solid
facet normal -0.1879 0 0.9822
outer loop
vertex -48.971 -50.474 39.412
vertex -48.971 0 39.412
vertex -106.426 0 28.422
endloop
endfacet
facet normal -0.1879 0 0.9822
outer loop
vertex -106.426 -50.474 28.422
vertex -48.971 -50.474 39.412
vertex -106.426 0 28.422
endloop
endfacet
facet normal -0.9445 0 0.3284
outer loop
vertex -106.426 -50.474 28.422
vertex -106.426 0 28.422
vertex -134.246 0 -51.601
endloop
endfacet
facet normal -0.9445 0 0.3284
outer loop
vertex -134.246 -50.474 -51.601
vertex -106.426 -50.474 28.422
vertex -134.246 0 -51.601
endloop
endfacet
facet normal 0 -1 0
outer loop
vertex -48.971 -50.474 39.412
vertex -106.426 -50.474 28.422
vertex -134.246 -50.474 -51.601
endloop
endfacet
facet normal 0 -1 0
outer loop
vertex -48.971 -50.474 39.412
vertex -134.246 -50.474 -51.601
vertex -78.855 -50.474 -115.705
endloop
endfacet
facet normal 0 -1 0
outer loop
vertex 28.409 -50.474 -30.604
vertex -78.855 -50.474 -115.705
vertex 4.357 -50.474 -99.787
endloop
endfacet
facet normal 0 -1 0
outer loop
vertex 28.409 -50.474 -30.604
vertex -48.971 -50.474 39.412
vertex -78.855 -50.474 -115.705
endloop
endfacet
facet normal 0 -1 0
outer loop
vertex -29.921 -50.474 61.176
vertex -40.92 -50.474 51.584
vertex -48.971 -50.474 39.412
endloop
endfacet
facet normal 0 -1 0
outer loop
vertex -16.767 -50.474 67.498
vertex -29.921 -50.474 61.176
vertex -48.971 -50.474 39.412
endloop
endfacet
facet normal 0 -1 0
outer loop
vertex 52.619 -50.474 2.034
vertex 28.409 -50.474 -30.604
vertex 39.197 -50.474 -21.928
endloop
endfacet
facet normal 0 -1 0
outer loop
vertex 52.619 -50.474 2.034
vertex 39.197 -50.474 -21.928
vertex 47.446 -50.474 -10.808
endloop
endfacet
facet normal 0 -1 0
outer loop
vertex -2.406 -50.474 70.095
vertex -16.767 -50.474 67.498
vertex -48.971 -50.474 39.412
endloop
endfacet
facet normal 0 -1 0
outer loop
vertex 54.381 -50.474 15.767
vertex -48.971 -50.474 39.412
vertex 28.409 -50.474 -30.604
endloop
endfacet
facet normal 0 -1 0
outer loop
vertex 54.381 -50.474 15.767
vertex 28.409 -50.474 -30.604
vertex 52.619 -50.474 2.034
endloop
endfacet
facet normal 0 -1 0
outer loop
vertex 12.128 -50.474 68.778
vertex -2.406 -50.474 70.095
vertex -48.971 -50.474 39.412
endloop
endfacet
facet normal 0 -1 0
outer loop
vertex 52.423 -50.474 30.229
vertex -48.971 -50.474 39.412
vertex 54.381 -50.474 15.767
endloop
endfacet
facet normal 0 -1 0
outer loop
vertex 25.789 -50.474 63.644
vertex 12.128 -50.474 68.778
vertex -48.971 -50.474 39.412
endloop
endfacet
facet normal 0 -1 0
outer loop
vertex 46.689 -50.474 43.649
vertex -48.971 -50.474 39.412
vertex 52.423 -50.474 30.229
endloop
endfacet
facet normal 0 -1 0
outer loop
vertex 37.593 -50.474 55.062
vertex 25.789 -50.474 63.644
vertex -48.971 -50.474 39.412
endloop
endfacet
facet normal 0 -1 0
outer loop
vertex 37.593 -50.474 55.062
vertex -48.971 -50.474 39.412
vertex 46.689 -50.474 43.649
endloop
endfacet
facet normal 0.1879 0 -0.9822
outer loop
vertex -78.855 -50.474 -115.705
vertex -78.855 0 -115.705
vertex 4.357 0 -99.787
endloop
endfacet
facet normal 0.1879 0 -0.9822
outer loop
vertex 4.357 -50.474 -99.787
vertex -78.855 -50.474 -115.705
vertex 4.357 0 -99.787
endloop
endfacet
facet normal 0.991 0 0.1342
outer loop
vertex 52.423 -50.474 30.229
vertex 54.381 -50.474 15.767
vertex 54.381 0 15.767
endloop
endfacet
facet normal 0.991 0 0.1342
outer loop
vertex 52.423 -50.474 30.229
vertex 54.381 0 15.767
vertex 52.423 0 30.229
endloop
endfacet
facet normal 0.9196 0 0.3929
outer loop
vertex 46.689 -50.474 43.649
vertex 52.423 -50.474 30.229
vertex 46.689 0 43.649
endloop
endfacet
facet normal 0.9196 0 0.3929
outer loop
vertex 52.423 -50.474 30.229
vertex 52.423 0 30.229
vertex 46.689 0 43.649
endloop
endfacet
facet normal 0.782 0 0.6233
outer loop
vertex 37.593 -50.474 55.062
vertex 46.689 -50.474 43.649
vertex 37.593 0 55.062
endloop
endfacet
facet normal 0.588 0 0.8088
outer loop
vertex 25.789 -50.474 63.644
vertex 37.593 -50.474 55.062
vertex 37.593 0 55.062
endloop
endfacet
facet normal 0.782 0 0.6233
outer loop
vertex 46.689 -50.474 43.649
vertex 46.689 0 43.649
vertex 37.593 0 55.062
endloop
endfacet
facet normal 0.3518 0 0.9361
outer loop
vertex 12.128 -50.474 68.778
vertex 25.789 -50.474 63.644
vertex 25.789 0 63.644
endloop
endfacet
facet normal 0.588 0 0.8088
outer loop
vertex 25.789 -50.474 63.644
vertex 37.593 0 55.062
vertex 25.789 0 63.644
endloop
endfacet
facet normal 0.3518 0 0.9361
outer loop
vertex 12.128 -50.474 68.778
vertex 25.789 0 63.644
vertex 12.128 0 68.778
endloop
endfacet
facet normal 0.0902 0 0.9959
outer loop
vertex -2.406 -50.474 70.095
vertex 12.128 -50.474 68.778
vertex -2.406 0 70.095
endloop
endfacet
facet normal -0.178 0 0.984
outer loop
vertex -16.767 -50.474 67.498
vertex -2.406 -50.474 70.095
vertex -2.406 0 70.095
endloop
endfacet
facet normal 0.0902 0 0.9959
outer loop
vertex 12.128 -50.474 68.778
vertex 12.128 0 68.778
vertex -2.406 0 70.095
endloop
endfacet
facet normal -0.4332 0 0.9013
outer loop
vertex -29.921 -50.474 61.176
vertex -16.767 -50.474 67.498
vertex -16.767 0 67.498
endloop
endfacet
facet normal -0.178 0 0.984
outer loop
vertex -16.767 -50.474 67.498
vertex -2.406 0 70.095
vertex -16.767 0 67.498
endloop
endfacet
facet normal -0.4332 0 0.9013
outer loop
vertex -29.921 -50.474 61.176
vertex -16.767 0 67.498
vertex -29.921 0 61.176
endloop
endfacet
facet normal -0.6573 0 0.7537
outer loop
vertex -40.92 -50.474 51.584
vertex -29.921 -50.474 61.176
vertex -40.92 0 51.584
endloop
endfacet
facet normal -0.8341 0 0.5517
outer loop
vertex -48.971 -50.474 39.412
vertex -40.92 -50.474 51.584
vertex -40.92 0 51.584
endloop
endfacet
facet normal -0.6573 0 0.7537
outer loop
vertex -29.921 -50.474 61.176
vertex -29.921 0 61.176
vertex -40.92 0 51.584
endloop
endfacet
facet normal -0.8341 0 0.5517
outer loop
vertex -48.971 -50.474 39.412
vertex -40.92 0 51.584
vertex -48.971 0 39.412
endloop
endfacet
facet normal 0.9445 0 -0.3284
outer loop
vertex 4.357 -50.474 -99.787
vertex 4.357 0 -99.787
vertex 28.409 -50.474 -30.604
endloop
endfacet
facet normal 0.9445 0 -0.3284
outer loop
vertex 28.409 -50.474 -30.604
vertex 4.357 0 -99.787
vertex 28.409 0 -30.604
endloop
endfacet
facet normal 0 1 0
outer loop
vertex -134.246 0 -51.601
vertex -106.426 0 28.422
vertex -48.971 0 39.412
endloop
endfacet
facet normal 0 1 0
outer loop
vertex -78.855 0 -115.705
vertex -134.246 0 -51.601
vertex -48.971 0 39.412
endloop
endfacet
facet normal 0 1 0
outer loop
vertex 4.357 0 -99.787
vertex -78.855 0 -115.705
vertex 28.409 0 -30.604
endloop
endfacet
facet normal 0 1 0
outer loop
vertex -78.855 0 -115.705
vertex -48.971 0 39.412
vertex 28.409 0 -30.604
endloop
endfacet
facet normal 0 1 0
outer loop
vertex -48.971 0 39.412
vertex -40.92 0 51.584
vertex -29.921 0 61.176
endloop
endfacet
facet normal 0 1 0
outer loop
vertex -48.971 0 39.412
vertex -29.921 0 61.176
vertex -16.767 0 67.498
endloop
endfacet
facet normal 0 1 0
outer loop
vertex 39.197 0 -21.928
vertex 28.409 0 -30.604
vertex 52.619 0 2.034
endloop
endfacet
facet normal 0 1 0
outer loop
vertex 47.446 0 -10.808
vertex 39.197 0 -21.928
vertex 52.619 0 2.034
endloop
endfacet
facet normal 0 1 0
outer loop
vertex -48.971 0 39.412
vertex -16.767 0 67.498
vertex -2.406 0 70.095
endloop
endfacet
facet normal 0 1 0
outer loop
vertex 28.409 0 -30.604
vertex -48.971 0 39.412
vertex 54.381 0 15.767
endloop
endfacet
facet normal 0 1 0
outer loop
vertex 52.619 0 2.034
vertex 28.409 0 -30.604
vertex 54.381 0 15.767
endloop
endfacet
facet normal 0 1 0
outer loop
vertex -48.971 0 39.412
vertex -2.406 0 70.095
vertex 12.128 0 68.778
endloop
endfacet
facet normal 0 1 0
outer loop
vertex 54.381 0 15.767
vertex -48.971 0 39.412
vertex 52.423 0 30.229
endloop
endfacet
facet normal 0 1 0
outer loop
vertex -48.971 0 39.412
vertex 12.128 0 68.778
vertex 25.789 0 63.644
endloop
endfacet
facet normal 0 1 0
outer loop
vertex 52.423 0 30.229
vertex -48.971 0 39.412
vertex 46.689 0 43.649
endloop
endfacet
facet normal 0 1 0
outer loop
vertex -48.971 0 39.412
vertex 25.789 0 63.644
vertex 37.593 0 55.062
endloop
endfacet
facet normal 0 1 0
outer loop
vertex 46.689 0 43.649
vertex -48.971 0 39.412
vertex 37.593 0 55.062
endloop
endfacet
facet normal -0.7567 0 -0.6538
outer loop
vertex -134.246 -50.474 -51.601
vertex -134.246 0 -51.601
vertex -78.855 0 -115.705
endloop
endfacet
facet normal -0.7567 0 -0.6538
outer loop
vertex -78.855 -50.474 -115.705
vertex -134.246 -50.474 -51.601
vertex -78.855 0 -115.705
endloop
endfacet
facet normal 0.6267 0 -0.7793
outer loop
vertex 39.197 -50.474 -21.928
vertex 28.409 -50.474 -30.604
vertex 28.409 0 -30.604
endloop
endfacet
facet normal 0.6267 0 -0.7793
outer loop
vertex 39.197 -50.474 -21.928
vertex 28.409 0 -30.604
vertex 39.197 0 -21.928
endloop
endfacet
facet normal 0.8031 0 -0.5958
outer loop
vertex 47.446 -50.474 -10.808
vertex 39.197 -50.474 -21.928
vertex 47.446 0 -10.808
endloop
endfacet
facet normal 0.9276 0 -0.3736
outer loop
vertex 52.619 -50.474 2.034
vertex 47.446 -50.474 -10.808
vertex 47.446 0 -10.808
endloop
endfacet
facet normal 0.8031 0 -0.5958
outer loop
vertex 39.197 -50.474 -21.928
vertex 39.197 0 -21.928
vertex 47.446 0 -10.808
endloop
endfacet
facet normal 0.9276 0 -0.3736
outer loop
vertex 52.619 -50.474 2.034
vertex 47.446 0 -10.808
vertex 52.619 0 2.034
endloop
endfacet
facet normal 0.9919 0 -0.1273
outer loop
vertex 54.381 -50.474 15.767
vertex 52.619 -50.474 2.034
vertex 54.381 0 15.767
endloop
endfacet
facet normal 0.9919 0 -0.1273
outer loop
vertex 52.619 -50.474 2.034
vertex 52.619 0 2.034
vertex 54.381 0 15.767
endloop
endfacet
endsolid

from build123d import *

# Parameters (mm, degrees)
F1_DEPTH = 50.4742488265


with BuildPart() as f1:
    # F0 (on Front) → F1 (new body)
    with BuildSketch(Plane.XZ):
        with BuildLine():
            ThreePointArc((28.4085404041, -30.6041326868), (47.4457170487, -10.8078252685), (54.3811030527, 15.7667547464))
            ThreePointArc((54.3811030527, 15.7667547464), (12.1282693342, 68.7781634448), (-48.9713224935, 39.4123450854))
            Line((-48.9713224934, 39.4123450854), (-23.2140926992, 44.3395745417))
            Line((-23.2140926992, 44.3395745417), (32.1769656266, -19.7646844725))
            Line((32.1769656266, -19.7646844725), (28.4085404041, -30.6041326868))
        make_face()
        with BuildLine():
            Line((-23.2140926992, 44.3395745417), (-48.9713224934, 39.4123450854))
            ThreePointArc((-48.9713224935, 39.4123450854), (-36.4867618694, -24.5571907142), (28.4085404041, -30.6041326868))
            Line((28.4085404041, -30.6041326868), (32.1769656266, -19.7646844725))
            Line((32.1769656266, -19.7646844725), (-23.2140926992, 44.3395745417))
        make_face()
        with BuildLine():
            ThreePointArc((28.4085404041, -30.6041326868), (-36.4867618694, -24.5571907142), (-48.9713224935, 39.4123450854))
            Line((-48.9713224934, 39.4123450854), (-106.4255386591, 28.4216403961))
            Line((-106.4255386591, 28.4216403961), (-134.2459262932, -51.6005527636))
            Line((-134.2459262932, -51.6005527636), (-78.8548679675, -115.7048117777))
            Line((-78.8548679675, -115.7048117777), (4.3565779924, -99.7868776321))
            Line((4.3565779924, -99.7868776321), (28.4085404041, -30.6041326868))
        make_face()
    extrude(amount=F1_DEPTH)


solid = f1.part
